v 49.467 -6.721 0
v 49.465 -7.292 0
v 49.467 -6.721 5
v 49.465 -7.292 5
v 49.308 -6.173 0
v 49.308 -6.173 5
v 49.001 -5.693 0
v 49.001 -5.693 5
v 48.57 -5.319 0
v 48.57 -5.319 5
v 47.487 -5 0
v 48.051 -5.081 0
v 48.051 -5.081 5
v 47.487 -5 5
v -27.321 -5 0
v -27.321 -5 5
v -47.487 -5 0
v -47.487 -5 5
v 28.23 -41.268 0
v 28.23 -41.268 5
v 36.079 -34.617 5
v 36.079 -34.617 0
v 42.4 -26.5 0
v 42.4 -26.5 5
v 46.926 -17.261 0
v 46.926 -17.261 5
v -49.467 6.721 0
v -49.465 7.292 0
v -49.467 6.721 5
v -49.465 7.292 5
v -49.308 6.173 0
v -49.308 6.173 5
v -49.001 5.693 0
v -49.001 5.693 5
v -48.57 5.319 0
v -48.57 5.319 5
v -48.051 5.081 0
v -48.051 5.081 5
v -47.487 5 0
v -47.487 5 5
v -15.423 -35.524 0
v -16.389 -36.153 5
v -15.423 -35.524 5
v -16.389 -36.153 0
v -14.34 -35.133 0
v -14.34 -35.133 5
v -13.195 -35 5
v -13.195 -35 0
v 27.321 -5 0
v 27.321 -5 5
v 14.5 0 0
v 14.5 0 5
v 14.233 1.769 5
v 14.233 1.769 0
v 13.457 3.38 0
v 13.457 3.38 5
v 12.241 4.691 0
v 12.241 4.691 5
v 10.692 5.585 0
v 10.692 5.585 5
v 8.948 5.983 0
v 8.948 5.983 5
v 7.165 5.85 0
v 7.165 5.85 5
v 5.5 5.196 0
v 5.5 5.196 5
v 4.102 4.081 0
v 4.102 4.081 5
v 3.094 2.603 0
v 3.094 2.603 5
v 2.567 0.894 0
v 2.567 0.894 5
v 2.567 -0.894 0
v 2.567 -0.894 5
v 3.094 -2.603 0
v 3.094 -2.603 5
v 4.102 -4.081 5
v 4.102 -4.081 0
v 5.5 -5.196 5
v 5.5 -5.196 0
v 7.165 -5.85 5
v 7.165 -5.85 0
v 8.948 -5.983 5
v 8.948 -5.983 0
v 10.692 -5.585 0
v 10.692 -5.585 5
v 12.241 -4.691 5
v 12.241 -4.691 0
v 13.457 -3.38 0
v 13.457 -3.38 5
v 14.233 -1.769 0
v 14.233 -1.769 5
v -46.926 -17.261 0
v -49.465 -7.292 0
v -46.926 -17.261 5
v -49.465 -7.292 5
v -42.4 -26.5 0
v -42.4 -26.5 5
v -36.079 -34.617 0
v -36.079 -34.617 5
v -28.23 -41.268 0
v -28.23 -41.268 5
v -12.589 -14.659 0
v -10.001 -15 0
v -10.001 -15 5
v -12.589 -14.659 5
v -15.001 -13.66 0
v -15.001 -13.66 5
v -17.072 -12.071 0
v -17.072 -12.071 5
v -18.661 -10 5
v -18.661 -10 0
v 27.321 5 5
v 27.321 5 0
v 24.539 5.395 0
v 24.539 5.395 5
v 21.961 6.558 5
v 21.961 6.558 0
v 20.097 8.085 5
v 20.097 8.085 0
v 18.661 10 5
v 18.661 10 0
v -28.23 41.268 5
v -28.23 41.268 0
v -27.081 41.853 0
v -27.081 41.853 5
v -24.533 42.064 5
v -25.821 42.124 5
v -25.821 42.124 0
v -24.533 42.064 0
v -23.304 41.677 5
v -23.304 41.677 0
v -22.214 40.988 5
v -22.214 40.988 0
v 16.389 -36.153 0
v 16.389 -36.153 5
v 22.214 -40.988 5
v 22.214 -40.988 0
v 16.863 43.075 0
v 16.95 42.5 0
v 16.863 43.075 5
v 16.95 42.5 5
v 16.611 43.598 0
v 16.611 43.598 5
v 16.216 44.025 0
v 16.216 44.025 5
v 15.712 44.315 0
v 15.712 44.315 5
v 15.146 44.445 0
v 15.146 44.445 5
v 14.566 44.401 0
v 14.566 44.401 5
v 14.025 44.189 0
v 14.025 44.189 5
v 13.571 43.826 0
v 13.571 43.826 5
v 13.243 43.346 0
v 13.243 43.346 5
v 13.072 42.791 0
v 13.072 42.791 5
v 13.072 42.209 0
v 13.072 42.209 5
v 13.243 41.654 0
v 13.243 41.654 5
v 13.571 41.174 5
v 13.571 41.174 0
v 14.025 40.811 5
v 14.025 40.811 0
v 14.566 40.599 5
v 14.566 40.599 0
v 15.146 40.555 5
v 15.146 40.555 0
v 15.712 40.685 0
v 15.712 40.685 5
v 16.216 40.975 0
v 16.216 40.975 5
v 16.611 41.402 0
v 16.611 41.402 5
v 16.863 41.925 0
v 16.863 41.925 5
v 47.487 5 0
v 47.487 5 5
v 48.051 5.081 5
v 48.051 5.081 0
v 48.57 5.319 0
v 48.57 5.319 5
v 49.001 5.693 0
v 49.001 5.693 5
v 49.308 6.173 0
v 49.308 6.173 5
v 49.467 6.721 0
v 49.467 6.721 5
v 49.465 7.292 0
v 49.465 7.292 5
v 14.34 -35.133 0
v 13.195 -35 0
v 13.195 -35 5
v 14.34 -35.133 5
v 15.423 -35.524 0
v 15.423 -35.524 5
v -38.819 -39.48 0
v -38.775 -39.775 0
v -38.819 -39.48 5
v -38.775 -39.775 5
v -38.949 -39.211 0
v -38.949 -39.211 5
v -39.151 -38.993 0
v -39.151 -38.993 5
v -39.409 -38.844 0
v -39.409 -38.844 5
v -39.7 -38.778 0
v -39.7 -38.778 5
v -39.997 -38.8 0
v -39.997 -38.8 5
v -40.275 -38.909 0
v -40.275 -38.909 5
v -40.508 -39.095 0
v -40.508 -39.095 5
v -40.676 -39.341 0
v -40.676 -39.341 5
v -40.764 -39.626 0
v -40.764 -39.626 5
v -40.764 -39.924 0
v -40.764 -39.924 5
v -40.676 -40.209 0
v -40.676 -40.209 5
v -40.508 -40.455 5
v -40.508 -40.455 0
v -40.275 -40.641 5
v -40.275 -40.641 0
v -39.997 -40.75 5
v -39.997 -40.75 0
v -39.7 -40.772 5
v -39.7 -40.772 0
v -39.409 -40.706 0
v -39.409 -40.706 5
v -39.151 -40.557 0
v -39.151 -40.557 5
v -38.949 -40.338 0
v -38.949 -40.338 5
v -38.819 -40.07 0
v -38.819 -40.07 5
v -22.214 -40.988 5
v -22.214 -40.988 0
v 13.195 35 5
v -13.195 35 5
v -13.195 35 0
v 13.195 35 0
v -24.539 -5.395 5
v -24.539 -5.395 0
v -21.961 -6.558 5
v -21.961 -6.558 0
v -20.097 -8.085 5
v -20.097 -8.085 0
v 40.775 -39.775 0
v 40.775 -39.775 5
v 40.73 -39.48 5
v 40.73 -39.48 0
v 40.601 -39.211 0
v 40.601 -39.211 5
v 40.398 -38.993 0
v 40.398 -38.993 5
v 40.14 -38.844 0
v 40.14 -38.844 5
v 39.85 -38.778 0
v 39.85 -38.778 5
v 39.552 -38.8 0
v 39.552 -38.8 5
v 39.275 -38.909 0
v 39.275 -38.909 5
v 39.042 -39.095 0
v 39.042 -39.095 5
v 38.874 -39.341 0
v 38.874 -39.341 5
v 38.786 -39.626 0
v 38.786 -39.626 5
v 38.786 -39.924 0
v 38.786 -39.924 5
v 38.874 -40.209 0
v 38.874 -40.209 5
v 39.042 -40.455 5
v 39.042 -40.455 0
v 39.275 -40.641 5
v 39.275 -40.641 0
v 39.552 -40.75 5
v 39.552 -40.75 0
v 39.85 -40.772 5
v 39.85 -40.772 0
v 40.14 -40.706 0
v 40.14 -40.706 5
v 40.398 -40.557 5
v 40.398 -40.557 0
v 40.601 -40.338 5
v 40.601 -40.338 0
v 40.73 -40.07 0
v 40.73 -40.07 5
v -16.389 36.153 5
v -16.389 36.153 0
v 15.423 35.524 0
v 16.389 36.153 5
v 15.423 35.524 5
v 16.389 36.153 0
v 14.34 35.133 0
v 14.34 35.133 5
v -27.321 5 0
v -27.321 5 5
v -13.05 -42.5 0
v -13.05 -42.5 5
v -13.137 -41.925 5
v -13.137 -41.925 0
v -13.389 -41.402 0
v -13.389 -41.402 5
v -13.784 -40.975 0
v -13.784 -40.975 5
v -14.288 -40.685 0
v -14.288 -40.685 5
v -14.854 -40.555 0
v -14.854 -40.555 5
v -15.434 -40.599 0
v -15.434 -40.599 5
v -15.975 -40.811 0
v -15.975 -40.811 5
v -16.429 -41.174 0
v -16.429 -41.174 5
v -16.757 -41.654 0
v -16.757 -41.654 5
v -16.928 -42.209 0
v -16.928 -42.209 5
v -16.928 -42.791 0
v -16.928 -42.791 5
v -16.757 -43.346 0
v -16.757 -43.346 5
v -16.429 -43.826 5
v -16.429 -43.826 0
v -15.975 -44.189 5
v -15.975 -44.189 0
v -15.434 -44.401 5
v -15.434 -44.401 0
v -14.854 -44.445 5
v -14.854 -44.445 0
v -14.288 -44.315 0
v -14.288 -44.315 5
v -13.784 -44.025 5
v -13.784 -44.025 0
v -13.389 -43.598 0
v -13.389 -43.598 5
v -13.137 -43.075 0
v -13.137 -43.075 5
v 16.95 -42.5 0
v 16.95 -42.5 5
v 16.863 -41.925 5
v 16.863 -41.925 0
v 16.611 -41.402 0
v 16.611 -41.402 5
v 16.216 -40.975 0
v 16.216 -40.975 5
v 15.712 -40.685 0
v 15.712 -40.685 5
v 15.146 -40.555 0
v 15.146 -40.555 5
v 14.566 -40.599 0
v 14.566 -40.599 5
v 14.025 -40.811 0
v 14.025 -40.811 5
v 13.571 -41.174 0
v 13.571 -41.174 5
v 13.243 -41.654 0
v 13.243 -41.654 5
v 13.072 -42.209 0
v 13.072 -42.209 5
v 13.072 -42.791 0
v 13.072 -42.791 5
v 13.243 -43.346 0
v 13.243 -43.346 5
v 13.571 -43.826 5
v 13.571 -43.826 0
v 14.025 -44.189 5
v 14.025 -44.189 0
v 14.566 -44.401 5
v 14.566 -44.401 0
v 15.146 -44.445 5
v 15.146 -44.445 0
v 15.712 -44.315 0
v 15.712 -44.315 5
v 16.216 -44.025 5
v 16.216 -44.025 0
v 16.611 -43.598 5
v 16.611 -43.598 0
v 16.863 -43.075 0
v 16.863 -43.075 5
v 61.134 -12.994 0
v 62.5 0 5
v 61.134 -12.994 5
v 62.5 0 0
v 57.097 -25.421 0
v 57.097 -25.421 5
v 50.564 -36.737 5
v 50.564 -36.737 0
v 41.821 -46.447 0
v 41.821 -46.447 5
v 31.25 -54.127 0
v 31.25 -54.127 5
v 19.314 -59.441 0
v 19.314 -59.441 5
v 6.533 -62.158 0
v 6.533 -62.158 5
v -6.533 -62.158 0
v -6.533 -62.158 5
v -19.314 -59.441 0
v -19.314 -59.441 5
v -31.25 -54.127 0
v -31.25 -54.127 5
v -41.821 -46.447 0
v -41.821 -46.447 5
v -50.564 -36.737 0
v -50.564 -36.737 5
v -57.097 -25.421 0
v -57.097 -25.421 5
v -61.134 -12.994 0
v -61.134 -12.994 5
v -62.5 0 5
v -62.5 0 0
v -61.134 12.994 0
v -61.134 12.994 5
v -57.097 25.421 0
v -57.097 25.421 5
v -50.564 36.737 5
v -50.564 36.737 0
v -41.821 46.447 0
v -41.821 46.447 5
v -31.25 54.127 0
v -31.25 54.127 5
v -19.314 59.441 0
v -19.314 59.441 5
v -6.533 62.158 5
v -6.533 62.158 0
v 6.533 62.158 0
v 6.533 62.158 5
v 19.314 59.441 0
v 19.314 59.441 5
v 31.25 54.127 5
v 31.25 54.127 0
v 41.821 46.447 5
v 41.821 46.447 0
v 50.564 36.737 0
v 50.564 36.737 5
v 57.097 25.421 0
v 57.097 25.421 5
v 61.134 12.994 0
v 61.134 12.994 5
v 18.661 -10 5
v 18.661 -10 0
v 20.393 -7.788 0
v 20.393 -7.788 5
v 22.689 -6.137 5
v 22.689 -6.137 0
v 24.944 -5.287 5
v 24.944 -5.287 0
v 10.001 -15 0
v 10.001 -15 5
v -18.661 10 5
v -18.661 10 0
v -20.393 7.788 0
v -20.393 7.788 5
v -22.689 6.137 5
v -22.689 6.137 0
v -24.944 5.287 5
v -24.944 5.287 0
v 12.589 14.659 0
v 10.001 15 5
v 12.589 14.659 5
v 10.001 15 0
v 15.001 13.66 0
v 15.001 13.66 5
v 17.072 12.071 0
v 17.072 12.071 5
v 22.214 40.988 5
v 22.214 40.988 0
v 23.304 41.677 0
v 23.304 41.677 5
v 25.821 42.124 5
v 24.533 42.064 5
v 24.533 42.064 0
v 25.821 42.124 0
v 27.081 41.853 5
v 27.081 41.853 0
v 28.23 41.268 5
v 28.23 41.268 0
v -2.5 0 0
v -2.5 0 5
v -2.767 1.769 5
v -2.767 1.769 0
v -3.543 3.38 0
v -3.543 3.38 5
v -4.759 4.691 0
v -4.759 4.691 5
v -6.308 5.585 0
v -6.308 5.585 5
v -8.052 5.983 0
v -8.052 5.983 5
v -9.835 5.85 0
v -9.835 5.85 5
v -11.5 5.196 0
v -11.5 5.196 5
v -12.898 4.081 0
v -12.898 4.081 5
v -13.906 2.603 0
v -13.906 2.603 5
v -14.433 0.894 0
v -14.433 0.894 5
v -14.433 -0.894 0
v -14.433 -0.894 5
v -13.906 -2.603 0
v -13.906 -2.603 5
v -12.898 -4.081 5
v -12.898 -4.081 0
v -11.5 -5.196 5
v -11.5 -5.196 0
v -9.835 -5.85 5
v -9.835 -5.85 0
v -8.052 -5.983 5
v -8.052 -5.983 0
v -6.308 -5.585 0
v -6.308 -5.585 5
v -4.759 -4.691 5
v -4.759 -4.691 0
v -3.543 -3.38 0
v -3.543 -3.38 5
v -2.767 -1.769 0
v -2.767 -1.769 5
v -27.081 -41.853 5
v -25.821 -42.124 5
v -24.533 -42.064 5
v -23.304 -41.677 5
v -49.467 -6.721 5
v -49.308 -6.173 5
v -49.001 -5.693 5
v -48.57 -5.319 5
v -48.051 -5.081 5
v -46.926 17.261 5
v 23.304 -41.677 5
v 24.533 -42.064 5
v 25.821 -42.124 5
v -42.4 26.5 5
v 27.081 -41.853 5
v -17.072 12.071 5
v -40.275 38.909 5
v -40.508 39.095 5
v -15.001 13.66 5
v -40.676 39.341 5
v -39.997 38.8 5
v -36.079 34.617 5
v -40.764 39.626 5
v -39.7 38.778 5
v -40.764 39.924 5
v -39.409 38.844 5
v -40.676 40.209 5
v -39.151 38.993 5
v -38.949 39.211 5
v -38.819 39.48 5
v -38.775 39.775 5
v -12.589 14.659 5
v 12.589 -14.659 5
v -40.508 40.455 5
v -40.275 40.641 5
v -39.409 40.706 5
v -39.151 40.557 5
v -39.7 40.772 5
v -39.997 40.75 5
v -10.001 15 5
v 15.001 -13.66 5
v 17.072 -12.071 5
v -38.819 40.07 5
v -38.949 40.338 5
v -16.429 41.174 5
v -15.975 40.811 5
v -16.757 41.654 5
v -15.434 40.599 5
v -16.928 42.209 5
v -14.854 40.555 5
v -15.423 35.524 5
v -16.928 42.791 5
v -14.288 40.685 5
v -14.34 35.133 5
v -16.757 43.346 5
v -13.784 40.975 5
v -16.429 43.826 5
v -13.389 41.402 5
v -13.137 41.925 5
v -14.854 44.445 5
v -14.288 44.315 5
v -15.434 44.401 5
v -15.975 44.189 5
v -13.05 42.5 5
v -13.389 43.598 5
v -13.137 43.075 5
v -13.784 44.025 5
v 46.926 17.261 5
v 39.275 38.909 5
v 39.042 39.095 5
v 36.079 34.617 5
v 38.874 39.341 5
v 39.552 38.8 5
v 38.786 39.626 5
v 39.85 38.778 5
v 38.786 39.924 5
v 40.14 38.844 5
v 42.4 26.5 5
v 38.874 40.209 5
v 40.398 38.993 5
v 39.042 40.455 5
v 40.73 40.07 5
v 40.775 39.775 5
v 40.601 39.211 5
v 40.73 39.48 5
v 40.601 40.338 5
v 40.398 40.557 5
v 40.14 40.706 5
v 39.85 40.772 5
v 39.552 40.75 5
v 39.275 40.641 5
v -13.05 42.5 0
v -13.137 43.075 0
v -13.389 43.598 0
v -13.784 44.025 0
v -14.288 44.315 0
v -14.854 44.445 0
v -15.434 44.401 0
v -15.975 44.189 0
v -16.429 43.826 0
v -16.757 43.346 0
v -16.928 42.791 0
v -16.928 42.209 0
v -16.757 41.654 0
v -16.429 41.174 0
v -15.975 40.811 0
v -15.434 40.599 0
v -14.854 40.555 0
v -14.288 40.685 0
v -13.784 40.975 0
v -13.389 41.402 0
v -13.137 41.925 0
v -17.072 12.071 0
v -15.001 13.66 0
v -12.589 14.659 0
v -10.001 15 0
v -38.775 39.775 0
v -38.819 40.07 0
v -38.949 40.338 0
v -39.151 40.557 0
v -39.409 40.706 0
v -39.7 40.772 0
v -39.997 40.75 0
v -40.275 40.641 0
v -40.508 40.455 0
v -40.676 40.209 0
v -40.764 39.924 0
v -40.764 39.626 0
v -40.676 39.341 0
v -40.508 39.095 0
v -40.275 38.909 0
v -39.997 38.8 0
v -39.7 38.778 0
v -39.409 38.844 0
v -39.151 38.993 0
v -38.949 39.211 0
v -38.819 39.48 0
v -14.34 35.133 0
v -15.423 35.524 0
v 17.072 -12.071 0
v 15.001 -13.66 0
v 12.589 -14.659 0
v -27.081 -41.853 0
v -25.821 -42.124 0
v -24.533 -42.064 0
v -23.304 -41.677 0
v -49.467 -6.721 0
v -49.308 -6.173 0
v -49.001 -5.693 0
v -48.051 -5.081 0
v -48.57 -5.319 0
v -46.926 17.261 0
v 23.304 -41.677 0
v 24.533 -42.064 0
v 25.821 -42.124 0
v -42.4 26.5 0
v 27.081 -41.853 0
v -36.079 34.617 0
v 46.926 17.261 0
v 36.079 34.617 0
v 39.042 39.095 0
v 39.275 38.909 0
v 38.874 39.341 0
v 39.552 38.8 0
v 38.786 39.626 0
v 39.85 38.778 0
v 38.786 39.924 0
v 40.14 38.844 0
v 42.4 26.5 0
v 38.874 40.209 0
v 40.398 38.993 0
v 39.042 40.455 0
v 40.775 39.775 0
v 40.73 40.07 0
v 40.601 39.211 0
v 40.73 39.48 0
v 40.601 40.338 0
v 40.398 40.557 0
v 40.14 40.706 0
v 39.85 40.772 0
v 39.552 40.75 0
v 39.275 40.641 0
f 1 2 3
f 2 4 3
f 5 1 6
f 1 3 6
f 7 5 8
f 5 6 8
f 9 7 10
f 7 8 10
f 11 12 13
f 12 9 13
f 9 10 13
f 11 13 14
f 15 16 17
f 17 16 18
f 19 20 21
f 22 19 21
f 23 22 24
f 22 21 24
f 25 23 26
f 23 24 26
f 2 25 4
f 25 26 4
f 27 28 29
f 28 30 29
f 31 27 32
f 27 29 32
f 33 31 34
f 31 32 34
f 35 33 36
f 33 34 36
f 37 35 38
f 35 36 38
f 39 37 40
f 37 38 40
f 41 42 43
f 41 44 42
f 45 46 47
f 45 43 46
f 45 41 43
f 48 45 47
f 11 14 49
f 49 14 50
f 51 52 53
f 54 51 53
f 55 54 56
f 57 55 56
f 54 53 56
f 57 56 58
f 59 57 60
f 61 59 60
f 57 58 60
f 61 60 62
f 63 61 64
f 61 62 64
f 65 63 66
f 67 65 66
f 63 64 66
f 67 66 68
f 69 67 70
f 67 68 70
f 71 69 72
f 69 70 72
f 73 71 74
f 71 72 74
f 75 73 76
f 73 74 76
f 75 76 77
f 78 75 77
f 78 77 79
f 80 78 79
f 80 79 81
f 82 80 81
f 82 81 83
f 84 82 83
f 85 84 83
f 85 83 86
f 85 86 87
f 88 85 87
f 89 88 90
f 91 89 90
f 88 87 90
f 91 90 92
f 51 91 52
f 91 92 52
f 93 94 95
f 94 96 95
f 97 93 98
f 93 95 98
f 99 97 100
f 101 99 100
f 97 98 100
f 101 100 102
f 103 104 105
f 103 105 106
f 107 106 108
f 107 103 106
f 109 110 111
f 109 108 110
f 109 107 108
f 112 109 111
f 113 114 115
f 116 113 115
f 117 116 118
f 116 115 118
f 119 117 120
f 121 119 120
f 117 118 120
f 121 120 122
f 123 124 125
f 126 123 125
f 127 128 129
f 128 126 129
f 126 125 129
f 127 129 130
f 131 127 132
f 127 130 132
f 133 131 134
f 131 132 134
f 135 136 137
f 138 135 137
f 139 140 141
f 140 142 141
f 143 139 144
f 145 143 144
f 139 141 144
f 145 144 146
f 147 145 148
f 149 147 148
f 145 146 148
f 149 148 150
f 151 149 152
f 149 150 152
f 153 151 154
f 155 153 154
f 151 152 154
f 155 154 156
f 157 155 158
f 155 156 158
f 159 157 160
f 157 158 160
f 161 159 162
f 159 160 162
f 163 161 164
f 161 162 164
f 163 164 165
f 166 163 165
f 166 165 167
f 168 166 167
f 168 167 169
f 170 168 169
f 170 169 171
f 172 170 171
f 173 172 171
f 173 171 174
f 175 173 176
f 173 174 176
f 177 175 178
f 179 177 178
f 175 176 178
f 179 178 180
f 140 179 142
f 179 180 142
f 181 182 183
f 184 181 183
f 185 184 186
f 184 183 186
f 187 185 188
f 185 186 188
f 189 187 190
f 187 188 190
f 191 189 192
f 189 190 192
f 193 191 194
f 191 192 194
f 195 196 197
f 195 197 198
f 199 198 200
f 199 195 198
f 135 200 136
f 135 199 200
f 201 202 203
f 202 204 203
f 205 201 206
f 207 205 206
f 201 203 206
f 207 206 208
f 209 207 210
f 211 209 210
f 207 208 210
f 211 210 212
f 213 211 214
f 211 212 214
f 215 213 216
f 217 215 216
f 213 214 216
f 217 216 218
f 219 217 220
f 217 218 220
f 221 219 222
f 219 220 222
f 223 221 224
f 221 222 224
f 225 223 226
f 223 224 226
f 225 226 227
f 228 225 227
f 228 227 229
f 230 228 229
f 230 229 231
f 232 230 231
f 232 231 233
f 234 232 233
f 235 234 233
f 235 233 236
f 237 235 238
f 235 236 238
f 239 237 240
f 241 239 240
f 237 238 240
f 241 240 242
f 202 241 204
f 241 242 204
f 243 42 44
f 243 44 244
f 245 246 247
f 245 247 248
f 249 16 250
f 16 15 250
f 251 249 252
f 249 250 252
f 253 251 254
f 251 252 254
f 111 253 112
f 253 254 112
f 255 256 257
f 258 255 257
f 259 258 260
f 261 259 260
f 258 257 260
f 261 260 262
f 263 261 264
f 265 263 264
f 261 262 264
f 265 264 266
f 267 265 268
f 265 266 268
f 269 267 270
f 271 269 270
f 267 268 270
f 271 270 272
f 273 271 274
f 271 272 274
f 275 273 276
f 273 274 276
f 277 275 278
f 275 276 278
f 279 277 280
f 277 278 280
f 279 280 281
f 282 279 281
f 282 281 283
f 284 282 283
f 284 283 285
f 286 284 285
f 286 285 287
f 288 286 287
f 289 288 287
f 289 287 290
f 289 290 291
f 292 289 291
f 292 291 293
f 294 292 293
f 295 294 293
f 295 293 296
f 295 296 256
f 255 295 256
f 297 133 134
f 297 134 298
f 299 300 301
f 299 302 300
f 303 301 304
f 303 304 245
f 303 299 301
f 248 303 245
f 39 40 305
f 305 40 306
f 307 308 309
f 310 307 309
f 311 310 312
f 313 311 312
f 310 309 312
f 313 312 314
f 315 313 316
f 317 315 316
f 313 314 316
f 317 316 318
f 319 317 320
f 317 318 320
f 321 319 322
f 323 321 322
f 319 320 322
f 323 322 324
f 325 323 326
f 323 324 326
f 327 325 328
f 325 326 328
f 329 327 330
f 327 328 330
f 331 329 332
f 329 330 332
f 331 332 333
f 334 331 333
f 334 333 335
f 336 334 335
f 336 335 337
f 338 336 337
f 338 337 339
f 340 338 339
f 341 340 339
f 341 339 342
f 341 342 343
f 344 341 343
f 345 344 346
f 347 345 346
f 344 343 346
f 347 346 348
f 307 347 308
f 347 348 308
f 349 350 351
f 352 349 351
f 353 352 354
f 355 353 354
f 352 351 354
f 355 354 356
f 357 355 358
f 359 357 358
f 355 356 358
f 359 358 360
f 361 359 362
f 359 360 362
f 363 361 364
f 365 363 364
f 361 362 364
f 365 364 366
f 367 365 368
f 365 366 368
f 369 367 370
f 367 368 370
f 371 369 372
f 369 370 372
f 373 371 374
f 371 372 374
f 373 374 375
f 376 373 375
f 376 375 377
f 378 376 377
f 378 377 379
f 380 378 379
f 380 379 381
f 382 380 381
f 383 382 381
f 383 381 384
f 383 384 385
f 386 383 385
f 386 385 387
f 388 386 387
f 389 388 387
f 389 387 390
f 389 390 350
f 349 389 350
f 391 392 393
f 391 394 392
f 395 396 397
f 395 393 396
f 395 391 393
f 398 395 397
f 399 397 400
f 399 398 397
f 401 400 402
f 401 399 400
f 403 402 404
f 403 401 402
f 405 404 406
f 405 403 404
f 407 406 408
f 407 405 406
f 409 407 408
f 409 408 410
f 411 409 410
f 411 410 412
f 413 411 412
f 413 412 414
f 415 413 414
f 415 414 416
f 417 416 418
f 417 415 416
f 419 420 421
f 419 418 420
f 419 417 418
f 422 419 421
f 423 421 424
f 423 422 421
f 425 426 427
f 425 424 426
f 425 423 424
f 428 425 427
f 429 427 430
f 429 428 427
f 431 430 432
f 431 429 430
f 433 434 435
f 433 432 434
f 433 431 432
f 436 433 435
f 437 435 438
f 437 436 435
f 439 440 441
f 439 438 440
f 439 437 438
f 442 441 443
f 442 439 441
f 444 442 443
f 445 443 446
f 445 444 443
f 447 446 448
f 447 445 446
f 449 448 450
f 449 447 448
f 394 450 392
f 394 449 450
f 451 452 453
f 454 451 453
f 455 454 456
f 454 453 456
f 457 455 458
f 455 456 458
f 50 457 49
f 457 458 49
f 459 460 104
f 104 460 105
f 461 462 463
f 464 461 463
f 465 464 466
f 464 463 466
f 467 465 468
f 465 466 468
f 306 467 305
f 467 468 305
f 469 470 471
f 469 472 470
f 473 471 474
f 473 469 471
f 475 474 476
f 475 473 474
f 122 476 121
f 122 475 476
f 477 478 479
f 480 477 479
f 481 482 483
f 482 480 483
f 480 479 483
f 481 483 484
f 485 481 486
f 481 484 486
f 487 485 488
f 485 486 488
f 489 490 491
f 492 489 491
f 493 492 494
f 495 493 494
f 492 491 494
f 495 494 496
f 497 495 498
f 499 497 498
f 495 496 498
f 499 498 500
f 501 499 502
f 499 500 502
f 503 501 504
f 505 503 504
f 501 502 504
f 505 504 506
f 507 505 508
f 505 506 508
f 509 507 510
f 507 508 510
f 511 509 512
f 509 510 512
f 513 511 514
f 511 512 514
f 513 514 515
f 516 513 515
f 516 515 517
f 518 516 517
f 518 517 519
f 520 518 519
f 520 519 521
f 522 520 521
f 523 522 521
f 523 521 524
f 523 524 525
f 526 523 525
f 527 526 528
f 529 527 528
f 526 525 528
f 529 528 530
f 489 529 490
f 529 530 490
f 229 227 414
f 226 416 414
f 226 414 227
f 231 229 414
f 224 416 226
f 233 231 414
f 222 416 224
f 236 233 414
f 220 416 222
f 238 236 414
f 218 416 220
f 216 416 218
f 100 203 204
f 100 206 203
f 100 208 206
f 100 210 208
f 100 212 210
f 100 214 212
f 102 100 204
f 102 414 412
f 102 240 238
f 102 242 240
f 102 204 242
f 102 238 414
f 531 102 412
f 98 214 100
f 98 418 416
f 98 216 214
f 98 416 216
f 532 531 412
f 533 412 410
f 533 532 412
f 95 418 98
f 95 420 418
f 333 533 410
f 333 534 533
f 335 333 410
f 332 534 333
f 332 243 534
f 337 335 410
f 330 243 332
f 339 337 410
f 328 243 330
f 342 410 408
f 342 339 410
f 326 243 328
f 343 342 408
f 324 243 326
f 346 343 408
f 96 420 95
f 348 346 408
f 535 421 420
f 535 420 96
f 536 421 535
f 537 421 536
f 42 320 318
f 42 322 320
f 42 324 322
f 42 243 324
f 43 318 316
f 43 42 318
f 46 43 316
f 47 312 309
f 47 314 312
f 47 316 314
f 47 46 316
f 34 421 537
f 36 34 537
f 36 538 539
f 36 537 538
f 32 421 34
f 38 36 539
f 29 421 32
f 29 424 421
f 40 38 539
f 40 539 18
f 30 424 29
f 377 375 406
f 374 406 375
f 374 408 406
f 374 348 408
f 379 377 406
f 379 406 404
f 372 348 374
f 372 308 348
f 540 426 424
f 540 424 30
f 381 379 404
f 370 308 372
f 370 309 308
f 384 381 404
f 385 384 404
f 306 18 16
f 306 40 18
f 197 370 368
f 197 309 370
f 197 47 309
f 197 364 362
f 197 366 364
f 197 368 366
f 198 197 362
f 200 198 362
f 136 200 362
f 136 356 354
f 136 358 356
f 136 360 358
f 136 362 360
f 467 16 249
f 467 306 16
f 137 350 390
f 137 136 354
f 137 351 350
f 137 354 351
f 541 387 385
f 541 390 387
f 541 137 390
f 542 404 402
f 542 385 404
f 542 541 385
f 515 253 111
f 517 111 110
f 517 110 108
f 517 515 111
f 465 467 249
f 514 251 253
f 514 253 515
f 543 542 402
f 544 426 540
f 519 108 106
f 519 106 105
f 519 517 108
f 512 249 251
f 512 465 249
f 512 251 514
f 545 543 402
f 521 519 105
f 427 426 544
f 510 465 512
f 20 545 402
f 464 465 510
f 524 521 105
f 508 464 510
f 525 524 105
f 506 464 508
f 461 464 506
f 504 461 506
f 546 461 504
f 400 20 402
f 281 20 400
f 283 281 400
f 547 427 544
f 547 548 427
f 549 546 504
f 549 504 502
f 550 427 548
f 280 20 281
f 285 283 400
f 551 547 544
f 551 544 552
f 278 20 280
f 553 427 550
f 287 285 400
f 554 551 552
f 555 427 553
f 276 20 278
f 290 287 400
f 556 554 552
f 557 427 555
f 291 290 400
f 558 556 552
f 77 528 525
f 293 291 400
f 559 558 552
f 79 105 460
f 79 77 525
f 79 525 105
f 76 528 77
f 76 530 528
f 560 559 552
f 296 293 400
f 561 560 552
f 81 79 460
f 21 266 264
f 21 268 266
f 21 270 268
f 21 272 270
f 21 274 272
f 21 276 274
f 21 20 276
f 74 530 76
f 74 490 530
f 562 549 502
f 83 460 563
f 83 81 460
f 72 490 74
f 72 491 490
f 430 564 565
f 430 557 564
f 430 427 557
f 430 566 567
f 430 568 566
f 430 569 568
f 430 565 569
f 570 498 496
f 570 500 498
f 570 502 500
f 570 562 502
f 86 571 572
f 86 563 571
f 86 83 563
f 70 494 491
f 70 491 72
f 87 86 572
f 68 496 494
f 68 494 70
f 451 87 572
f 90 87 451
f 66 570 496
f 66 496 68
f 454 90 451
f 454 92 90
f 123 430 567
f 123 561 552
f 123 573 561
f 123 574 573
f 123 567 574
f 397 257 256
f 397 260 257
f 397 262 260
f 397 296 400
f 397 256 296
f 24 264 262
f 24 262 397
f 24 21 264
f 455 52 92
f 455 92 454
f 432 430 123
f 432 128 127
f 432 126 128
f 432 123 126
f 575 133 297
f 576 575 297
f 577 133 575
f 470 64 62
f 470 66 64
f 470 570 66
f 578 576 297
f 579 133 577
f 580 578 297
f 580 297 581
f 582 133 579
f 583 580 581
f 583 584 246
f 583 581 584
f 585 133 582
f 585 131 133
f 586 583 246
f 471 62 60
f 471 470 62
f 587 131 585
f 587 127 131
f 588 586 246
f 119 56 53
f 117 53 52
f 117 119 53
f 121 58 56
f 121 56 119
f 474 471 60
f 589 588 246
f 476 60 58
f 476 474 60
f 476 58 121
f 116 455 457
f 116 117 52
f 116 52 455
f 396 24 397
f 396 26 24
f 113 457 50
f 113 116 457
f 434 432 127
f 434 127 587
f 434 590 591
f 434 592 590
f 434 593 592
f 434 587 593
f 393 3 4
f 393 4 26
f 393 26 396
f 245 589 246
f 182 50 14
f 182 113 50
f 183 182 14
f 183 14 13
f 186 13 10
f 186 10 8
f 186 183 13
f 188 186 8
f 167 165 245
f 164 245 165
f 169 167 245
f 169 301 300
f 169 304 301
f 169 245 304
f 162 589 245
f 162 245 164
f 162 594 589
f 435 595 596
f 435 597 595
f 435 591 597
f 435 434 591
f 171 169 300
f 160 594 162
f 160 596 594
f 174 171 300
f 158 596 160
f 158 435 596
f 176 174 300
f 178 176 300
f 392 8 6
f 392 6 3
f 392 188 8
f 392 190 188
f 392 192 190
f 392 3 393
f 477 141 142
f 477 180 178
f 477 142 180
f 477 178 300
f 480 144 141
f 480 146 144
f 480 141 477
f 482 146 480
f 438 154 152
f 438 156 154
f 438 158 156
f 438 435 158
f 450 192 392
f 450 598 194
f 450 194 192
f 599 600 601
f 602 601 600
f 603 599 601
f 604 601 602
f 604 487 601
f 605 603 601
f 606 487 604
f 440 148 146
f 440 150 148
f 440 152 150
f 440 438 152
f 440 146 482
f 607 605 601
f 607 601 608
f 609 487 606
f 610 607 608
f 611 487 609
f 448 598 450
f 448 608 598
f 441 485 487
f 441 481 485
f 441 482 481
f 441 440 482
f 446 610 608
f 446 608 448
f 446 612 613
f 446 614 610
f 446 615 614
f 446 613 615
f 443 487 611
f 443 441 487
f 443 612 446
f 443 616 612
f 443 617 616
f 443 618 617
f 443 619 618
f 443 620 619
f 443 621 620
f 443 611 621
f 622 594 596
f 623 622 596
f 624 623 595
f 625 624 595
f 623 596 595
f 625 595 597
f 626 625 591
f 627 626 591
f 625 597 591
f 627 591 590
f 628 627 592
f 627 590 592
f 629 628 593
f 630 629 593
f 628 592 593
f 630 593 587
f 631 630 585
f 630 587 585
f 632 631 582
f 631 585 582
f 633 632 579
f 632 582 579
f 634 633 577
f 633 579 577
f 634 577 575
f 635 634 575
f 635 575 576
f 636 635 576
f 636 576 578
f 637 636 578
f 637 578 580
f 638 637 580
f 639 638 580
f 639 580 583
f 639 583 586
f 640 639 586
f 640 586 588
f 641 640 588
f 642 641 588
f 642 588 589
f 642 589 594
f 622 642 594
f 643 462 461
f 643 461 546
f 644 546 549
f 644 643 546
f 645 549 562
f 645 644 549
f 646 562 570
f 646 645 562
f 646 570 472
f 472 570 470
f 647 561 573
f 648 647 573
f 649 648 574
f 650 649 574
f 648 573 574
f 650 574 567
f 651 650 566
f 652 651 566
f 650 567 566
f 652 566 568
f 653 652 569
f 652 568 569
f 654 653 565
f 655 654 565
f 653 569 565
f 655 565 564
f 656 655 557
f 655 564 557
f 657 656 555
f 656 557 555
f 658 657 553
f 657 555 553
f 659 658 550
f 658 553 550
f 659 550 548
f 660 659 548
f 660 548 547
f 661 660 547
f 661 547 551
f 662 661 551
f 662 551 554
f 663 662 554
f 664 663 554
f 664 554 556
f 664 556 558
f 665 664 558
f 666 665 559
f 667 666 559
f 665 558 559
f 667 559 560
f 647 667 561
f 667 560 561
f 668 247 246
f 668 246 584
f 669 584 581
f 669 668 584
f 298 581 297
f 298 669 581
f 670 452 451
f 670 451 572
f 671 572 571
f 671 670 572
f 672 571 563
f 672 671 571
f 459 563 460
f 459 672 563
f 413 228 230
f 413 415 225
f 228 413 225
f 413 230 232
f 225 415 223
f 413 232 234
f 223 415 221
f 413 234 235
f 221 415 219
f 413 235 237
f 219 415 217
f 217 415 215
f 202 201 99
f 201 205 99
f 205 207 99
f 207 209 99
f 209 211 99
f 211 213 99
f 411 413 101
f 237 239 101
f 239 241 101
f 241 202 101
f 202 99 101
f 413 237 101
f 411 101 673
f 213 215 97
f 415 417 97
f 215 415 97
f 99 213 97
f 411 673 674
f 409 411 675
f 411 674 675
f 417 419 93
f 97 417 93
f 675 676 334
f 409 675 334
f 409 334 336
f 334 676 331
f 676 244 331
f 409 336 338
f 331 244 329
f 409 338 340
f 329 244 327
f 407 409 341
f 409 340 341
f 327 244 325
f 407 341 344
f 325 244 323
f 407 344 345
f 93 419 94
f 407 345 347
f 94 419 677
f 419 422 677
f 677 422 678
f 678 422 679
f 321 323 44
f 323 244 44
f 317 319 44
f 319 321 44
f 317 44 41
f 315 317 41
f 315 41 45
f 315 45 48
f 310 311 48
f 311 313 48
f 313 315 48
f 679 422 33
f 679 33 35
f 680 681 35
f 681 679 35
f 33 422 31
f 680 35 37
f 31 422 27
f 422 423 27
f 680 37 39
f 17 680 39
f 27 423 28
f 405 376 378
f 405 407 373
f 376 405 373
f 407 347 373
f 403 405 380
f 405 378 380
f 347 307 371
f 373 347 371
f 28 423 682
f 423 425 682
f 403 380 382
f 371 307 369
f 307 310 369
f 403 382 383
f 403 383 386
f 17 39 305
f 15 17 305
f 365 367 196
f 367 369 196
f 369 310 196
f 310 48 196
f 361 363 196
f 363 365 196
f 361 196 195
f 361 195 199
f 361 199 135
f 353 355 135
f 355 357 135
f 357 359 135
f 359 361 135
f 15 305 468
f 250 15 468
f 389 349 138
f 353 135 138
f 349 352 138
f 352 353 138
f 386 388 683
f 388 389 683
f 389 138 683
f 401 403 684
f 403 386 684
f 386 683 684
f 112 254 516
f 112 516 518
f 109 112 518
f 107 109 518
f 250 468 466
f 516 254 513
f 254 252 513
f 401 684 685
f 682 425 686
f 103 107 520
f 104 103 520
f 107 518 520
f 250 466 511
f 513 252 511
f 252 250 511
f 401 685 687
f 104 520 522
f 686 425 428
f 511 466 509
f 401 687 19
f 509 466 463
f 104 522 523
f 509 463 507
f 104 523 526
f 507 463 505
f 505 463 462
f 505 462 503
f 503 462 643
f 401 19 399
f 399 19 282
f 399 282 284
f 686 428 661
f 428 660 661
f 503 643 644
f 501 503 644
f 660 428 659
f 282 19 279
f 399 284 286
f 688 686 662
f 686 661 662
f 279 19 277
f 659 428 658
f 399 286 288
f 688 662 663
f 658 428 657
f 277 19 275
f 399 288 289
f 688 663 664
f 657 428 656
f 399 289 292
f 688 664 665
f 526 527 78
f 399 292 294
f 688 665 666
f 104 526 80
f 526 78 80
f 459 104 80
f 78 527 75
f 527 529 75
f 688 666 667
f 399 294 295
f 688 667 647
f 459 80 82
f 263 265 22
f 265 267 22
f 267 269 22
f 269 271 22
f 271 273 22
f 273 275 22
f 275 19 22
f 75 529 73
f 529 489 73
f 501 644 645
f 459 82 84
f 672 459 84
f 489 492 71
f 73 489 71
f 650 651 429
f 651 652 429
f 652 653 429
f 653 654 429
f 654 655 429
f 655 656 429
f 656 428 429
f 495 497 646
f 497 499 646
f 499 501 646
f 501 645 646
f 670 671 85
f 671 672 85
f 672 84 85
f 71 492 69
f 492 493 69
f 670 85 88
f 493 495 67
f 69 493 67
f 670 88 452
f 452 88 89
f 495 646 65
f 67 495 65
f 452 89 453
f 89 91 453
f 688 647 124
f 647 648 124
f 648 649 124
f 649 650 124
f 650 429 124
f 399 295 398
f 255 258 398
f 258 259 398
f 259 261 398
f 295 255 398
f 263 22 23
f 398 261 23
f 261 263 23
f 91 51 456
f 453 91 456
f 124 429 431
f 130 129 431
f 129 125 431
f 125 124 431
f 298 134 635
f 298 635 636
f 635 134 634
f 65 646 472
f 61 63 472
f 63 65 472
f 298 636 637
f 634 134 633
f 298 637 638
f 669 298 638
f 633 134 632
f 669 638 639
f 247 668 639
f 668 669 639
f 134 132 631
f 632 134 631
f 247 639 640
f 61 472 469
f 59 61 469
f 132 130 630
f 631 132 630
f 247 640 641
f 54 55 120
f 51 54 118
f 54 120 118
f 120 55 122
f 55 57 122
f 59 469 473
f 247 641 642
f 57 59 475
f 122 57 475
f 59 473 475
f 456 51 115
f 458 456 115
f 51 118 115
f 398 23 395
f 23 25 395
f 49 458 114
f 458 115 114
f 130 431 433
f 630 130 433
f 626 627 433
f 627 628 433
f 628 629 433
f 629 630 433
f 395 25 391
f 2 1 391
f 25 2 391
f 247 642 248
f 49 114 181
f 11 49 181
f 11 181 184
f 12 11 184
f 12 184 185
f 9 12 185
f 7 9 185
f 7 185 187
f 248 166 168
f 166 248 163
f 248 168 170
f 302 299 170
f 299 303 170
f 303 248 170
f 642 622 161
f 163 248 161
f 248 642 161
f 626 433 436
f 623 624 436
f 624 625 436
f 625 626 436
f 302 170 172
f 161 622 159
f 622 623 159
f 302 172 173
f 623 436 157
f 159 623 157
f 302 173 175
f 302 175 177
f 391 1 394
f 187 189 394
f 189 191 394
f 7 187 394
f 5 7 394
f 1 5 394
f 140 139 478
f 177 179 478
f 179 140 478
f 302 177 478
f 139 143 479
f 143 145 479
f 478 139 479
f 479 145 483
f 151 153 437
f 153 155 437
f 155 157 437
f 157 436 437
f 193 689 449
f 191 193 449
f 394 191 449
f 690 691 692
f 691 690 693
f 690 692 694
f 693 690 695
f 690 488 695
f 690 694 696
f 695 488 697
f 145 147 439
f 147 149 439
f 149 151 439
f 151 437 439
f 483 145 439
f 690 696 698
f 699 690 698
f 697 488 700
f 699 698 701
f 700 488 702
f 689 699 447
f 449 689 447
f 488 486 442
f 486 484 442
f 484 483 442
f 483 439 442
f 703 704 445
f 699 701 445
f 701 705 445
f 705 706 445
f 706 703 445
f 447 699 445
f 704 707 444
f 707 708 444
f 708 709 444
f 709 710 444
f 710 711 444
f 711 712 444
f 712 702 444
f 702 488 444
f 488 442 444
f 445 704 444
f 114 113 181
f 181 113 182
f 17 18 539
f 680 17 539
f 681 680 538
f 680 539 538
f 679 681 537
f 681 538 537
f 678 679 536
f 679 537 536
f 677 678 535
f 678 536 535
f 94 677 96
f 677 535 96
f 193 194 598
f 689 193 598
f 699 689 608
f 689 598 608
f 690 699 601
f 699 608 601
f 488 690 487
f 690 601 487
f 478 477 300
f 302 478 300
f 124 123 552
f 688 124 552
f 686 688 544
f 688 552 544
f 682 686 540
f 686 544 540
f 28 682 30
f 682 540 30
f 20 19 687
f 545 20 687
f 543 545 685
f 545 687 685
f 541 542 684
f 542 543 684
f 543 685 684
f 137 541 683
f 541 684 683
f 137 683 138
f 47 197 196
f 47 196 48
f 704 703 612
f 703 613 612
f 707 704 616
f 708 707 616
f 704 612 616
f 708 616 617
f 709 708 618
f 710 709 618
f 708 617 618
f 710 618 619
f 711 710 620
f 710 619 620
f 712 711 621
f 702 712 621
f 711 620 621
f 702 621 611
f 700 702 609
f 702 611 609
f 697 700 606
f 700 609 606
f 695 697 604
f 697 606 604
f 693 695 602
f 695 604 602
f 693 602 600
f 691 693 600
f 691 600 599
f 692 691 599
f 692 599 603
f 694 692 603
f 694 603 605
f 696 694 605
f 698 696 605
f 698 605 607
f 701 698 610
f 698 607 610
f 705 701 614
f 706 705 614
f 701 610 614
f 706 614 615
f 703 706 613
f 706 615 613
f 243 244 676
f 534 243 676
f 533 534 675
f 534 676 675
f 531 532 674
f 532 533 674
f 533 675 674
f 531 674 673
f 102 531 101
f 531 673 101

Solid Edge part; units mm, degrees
sketch "Sketch1" plane through (0, 0, 0) normal (0, 0, 1) x (1, 0, 0)
  circle A0 centre (0, 0) radius 62.5
extrude "Protrusion1" add sketch "Sketch1" along normal blind 5
sketch "Sketch2" plane through (0, 0, 5) normal (0, 0, 1) x (1, 0, 0)
  circle A0 centre (15, -42.5) radius 1.95
  circle A1 centre (-15, -42.5) radius 1.95
  circle A2 centre (-15, 42.5) radius 1.95
  circle A3 centre (15, 42.5) radius 1.95
  dimension "D1" = 3.9
  dimension "D2" = 85
  dimension "D3" = 30
extrude "Cutout1" cut sketch "Sketch2" against normal through all
sketch "Sketch3" plane through (0, 0, 5) normal (0, 0, 1) x (1, 0, 0)
  line L0 (-15, -35) -> (-25, -43.3013)
  arc A0 (-25, -43.3013) -> (-25, 43.3013) centre (0, 0) cw
  line L1 (-25, 43.3013) -> (-15, 35)
  line L2 (-15, 35) -> (15, 35)
  line L3 (25, 43.3013) -> (15, 35)
  line L4 (15, -35) -> (25, -43.3013)
  line L5 (15, -35) -> (-15, -35)
  arc A1 (25, 43.3013) -> (25, -43.3013) centre (0, 0) cw
extrude "Cutout2" cut sketch "Sketch3" against normal through all
fillet "Round_1" radius 5 8 edges at (-15, 35, 2.5) (15, 35, 2.5) (25, 43.3013, 2.5) (25, -43.3013, 2.5) (15, -35, 2.5) (-15, -35, 2.5) (-25, -43.3013, 2.5) (-25, 43.3013, 2.5)
sketch "Sketch4" plane through (0, 0, 5) normal (0, 0, 1) x (1, 0, 0)
  circle A0 centre (-39.7748, 39.7748) radius 1
  circle A1 centre (39.7748, 39.7748) radius 1
  circle A2 centre (39.7748, -39.7748) radius 1
  circle A3 centre (-39.7748, -39.7748) radius 1
  dimension "D1" = 112.5
  dimension "D2" = 2
extrude "Cutout3" cut sketch "Sketch4" against normal through all
sketch "Sketch5" plane through (0, 0, 5) normal (0, 0, 1) x (1, 0, 0)
  line L0 (-20, -5) -> (-56.0273, -5)
  line L1 (-56.0273, -5) -> (-56.0273, 5)
  line L2 (-56.0273, 5) -> (-20, 5)
  line L3 (-20, 5) -> (-20, 15)
  line L4 (-20, 15) -> (20, 15)
  line L5 (20, 15) -> (20, 5)
  line L6 (20, 5) -> (56.0273, 5)
  line L7 (56.0273, 5) -> (56.0273, -5)
  line L8 (56.0273, -5) -> (20, -5)
  line L9 (20, -5) -> (20, -15)
  line L10 (20, -15) -> (-20, -15)
  line L11 (-20, -15) -> (-20, -5)
extrude "Protrusion2" add sketch "Sketch5" against normal up to vertex (5 mm away)
fillet "Round_4" radius 10 4 edges at (-20, -15, 2.5) (20, -15, 2.5) (20, 15, 2.5) (-20, 15, 2.5)
fillet "Round_4" radius 2 4 edges at (-49.7494, -5, 2.5) (-49.7494, 5, 2.5) (49.7494, -5, 2.5) (49.7494, 5, 2.5)
sketch "Sketch6" plane through (0, 0, 5) normal (0, 0, 1) x (1, 0, 0)
  circle A0 centre (-8.5, 0) radius 6
  circle A1 centre (8.5, 0) radius 6
  dimension "D1" = 12
  dimension "D2" = 5
extrude "Cutout4" cut sketch "Sketch6" against normal through all
fillet "Round_5" radius 10 4 edges at (20, -5, 2.5) (20, 5, 2.5) (-20, 5, 2.5) (-20, -5, 2.5)
